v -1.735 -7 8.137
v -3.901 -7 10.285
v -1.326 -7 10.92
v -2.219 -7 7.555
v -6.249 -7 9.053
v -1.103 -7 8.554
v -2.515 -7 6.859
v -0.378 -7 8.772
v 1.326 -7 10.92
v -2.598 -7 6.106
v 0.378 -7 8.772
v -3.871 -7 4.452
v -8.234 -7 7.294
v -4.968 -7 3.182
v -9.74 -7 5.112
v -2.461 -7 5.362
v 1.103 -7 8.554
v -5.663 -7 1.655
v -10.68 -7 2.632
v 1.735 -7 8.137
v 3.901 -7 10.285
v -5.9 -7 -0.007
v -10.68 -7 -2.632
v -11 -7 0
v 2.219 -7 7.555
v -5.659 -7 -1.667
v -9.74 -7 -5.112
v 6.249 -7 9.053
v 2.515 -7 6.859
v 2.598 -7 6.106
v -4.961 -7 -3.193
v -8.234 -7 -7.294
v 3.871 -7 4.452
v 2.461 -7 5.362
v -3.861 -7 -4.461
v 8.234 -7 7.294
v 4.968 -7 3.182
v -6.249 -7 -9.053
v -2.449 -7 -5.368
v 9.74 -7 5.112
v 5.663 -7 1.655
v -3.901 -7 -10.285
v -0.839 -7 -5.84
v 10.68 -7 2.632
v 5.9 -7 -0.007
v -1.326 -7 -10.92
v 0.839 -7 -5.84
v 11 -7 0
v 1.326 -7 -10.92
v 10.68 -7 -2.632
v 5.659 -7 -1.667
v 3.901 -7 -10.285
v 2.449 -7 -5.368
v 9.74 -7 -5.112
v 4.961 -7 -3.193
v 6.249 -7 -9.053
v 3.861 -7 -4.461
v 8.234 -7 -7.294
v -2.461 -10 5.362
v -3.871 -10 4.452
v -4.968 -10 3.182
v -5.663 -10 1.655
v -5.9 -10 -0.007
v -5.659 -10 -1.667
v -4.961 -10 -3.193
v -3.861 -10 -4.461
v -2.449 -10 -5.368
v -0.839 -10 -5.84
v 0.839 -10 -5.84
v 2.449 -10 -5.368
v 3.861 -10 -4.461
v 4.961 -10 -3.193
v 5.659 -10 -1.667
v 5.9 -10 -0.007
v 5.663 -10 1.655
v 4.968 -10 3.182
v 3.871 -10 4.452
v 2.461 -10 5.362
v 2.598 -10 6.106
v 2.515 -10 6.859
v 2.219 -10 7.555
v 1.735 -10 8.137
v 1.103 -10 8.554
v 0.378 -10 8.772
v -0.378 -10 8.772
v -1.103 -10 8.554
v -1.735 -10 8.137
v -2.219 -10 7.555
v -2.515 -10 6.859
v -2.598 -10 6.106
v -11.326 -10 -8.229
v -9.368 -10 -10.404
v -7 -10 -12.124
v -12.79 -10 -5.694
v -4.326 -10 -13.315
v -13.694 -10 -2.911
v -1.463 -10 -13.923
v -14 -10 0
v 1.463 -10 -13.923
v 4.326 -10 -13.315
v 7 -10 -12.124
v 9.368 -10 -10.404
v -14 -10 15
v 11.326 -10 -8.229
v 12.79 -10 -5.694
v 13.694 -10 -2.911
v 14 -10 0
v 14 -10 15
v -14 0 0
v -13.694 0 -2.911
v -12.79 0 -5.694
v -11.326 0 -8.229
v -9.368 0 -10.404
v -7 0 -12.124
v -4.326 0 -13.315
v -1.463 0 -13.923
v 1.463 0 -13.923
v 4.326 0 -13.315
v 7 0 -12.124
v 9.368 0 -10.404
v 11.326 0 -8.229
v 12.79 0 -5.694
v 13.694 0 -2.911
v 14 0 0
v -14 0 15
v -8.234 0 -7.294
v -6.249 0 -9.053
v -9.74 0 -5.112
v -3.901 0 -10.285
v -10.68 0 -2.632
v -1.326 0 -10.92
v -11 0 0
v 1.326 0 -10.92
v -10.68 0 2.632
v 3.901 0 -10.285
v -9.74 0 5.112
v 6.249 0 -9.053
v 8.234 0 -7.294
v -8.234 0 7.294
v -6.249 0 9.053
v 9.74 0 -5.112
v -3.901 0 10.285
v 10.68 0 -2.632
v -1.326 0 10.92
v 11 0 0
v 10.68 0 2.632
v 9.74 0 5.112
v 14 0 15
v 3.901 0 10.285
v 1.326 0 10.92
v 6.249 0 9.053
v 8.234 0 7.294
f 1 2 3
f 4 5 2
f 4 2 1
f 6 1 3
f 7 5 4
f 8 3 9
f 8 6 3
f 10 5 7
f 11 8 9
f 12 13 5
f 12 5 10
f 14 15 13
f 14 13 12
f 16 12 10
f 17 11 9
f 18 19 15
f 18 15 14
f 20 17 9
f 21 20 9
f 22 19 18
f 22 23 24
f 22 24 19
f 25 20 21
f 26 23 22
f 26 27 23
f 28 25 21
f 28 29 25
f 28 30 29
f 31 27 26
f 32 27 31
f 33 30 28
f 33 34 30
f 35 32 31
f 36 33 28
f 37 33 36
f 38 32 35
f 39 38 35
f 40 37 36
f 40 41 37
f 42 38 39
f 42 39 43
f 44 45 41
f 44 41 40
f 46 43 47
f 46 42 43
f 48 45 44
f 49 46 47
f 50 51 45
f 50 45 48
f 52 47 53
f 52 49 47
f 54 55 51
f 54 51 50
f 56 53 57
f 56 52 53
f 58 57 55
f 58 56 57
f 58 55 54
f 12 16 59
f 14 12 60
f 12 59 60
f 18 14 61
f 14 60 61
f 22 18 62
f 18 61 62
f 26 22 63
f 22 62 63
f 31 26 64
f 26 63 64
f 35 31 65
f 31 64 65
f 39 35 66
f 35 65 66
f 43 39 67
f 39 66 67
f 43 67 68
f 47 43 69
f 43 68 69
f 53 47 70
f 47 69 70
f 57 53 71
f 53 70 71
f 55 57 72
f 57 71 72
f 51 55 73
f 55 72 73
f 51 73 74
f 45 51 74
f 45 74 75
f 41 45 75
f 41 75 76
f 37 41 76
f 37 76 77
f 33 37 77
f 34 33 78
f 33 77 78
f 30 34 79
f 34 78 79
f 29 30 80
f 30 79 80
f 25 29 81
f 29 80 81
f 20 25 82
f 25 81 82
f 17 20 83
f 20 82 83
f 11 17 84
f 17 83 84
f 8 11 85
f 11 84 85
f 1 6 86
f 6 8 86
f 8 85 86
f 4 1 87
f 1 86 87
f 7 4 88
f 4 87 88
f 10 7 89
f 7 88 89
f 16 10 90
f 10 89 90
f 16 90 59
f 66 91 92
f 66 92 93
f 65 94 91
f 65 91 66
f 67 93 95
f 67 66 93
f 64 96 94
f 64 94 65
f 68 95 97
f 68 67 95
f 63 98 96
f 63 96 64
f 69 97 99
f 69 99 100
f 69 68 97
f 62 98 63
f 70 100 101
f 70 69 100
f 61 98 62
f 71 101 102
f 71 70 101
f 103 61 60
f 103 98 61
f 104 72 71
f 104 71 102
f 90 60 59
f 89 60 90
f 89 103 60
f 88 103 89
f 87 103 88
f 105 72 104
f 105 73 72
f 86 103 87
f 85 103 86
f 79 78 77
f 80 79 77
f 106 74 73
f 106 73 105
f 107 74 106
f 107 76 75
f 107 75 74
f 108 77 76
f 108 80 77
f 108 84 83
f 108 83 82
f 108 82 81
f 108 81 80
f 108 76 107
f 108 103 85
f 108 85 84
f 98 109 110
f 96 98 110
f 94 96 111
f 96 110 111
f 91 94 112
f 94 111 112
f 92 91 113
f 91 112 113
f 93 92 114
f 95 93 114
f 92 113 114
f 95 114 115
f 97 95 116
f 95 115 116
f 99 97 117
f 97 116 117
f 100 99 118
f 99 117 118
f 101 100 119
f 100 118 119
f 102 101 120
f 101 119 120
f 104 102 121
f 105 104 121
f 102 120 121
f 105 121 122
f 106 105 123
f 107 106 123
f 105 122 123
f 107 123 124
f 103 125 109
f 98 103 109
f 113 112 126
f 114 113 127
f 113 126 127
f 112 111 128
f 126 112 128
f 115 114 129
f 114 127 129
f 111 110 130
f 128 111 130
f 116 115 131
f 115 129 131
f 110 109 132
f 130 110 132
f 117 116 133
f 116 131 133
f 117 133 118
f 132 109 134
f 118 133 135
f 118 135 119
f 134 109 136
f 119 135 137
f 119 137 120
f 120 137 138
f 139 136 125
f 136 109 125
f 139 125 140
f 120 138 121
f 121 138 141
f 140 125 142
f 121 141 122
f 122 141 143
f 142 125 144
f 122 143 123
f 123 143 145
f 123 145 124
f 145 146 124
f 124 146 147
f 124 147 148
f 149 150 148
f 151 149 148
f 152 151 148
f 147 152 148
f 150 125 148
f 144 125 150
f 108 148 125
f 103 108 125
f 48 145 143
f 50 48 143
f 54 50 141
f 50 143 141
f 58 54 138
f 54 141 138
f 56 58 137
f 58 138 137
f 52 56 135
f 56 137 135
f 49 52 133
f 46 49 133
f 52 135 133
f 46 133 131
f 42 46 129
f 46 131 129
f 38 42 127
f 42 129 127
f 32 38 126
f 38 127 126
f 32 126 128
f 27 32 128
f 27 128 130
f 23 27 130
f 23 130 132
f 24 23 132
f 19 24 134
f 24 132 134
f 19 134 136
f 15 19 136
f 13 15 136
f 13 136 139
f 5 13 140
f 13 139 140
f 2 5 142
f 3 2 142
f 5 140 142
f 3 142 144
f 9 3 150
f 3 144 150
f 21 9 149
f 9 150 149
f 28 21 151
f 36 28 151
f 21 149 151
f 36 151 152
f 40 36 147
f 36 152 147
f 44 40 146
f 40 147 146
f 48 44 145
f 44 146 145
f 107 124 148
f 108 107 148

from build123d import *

# Parameters (mm, degrees)
PAD_DEPTH       = 10
SKETCH002_R     = 11
POCKET_DEPTH    = 7
SKETCH003_R     = 5.9
POCKET001_DEPTH = 5
SKETCH004_R     = 2.6
POCKET002_DEPTH = 5


with BuildPart() as part:
    # Sketch → Pad (new body)
    with BuildSketch(Plane.XZ):
        with BuildLine():
            Line((-14, 15), (-14, 0))
            ThreePointArc((-14, 0), (0, -14), (14, 0))
            Line((14, 0), (14, 15))
            Line((14, 15), (-14, 15))
        make_face()
    extrude(amount=PAD_DEPTH)

    # Sketch002 (on Face5 of Pad) → Pocket (cut)
    with BuildSketch(Plane(origin=(0, 0, 0), x_dir=(1, 0, 0), z_dir=(0, 1, 0))):
        Circle(SKETCH002_R)
    extrude(amount=-POCKET_DEPTH, mode=Mode.SUBTRACT)

    # Sketch003 (on Face5 of Pocket) → Pocket001 (cut)
    with BuildSketch(Plane.XZ.offset(10)):
        Circle(SKETCH003_R)
    extrude(amount=-POCKET001_DEPTH, mode=Mode.SUBTRACT)

    # Sketch004 (on Face5 of Pocket001) → Pocket002 (cut)
    with BuildSketch(Plane.XZ.offset(10)):
        with Locations((0, 6.2)):
            Circle(SKETCH004_R)
    extrude(amount=-POCKET002_DEPTH, mode=Mode.SUBTRACT)


solid = part.part
